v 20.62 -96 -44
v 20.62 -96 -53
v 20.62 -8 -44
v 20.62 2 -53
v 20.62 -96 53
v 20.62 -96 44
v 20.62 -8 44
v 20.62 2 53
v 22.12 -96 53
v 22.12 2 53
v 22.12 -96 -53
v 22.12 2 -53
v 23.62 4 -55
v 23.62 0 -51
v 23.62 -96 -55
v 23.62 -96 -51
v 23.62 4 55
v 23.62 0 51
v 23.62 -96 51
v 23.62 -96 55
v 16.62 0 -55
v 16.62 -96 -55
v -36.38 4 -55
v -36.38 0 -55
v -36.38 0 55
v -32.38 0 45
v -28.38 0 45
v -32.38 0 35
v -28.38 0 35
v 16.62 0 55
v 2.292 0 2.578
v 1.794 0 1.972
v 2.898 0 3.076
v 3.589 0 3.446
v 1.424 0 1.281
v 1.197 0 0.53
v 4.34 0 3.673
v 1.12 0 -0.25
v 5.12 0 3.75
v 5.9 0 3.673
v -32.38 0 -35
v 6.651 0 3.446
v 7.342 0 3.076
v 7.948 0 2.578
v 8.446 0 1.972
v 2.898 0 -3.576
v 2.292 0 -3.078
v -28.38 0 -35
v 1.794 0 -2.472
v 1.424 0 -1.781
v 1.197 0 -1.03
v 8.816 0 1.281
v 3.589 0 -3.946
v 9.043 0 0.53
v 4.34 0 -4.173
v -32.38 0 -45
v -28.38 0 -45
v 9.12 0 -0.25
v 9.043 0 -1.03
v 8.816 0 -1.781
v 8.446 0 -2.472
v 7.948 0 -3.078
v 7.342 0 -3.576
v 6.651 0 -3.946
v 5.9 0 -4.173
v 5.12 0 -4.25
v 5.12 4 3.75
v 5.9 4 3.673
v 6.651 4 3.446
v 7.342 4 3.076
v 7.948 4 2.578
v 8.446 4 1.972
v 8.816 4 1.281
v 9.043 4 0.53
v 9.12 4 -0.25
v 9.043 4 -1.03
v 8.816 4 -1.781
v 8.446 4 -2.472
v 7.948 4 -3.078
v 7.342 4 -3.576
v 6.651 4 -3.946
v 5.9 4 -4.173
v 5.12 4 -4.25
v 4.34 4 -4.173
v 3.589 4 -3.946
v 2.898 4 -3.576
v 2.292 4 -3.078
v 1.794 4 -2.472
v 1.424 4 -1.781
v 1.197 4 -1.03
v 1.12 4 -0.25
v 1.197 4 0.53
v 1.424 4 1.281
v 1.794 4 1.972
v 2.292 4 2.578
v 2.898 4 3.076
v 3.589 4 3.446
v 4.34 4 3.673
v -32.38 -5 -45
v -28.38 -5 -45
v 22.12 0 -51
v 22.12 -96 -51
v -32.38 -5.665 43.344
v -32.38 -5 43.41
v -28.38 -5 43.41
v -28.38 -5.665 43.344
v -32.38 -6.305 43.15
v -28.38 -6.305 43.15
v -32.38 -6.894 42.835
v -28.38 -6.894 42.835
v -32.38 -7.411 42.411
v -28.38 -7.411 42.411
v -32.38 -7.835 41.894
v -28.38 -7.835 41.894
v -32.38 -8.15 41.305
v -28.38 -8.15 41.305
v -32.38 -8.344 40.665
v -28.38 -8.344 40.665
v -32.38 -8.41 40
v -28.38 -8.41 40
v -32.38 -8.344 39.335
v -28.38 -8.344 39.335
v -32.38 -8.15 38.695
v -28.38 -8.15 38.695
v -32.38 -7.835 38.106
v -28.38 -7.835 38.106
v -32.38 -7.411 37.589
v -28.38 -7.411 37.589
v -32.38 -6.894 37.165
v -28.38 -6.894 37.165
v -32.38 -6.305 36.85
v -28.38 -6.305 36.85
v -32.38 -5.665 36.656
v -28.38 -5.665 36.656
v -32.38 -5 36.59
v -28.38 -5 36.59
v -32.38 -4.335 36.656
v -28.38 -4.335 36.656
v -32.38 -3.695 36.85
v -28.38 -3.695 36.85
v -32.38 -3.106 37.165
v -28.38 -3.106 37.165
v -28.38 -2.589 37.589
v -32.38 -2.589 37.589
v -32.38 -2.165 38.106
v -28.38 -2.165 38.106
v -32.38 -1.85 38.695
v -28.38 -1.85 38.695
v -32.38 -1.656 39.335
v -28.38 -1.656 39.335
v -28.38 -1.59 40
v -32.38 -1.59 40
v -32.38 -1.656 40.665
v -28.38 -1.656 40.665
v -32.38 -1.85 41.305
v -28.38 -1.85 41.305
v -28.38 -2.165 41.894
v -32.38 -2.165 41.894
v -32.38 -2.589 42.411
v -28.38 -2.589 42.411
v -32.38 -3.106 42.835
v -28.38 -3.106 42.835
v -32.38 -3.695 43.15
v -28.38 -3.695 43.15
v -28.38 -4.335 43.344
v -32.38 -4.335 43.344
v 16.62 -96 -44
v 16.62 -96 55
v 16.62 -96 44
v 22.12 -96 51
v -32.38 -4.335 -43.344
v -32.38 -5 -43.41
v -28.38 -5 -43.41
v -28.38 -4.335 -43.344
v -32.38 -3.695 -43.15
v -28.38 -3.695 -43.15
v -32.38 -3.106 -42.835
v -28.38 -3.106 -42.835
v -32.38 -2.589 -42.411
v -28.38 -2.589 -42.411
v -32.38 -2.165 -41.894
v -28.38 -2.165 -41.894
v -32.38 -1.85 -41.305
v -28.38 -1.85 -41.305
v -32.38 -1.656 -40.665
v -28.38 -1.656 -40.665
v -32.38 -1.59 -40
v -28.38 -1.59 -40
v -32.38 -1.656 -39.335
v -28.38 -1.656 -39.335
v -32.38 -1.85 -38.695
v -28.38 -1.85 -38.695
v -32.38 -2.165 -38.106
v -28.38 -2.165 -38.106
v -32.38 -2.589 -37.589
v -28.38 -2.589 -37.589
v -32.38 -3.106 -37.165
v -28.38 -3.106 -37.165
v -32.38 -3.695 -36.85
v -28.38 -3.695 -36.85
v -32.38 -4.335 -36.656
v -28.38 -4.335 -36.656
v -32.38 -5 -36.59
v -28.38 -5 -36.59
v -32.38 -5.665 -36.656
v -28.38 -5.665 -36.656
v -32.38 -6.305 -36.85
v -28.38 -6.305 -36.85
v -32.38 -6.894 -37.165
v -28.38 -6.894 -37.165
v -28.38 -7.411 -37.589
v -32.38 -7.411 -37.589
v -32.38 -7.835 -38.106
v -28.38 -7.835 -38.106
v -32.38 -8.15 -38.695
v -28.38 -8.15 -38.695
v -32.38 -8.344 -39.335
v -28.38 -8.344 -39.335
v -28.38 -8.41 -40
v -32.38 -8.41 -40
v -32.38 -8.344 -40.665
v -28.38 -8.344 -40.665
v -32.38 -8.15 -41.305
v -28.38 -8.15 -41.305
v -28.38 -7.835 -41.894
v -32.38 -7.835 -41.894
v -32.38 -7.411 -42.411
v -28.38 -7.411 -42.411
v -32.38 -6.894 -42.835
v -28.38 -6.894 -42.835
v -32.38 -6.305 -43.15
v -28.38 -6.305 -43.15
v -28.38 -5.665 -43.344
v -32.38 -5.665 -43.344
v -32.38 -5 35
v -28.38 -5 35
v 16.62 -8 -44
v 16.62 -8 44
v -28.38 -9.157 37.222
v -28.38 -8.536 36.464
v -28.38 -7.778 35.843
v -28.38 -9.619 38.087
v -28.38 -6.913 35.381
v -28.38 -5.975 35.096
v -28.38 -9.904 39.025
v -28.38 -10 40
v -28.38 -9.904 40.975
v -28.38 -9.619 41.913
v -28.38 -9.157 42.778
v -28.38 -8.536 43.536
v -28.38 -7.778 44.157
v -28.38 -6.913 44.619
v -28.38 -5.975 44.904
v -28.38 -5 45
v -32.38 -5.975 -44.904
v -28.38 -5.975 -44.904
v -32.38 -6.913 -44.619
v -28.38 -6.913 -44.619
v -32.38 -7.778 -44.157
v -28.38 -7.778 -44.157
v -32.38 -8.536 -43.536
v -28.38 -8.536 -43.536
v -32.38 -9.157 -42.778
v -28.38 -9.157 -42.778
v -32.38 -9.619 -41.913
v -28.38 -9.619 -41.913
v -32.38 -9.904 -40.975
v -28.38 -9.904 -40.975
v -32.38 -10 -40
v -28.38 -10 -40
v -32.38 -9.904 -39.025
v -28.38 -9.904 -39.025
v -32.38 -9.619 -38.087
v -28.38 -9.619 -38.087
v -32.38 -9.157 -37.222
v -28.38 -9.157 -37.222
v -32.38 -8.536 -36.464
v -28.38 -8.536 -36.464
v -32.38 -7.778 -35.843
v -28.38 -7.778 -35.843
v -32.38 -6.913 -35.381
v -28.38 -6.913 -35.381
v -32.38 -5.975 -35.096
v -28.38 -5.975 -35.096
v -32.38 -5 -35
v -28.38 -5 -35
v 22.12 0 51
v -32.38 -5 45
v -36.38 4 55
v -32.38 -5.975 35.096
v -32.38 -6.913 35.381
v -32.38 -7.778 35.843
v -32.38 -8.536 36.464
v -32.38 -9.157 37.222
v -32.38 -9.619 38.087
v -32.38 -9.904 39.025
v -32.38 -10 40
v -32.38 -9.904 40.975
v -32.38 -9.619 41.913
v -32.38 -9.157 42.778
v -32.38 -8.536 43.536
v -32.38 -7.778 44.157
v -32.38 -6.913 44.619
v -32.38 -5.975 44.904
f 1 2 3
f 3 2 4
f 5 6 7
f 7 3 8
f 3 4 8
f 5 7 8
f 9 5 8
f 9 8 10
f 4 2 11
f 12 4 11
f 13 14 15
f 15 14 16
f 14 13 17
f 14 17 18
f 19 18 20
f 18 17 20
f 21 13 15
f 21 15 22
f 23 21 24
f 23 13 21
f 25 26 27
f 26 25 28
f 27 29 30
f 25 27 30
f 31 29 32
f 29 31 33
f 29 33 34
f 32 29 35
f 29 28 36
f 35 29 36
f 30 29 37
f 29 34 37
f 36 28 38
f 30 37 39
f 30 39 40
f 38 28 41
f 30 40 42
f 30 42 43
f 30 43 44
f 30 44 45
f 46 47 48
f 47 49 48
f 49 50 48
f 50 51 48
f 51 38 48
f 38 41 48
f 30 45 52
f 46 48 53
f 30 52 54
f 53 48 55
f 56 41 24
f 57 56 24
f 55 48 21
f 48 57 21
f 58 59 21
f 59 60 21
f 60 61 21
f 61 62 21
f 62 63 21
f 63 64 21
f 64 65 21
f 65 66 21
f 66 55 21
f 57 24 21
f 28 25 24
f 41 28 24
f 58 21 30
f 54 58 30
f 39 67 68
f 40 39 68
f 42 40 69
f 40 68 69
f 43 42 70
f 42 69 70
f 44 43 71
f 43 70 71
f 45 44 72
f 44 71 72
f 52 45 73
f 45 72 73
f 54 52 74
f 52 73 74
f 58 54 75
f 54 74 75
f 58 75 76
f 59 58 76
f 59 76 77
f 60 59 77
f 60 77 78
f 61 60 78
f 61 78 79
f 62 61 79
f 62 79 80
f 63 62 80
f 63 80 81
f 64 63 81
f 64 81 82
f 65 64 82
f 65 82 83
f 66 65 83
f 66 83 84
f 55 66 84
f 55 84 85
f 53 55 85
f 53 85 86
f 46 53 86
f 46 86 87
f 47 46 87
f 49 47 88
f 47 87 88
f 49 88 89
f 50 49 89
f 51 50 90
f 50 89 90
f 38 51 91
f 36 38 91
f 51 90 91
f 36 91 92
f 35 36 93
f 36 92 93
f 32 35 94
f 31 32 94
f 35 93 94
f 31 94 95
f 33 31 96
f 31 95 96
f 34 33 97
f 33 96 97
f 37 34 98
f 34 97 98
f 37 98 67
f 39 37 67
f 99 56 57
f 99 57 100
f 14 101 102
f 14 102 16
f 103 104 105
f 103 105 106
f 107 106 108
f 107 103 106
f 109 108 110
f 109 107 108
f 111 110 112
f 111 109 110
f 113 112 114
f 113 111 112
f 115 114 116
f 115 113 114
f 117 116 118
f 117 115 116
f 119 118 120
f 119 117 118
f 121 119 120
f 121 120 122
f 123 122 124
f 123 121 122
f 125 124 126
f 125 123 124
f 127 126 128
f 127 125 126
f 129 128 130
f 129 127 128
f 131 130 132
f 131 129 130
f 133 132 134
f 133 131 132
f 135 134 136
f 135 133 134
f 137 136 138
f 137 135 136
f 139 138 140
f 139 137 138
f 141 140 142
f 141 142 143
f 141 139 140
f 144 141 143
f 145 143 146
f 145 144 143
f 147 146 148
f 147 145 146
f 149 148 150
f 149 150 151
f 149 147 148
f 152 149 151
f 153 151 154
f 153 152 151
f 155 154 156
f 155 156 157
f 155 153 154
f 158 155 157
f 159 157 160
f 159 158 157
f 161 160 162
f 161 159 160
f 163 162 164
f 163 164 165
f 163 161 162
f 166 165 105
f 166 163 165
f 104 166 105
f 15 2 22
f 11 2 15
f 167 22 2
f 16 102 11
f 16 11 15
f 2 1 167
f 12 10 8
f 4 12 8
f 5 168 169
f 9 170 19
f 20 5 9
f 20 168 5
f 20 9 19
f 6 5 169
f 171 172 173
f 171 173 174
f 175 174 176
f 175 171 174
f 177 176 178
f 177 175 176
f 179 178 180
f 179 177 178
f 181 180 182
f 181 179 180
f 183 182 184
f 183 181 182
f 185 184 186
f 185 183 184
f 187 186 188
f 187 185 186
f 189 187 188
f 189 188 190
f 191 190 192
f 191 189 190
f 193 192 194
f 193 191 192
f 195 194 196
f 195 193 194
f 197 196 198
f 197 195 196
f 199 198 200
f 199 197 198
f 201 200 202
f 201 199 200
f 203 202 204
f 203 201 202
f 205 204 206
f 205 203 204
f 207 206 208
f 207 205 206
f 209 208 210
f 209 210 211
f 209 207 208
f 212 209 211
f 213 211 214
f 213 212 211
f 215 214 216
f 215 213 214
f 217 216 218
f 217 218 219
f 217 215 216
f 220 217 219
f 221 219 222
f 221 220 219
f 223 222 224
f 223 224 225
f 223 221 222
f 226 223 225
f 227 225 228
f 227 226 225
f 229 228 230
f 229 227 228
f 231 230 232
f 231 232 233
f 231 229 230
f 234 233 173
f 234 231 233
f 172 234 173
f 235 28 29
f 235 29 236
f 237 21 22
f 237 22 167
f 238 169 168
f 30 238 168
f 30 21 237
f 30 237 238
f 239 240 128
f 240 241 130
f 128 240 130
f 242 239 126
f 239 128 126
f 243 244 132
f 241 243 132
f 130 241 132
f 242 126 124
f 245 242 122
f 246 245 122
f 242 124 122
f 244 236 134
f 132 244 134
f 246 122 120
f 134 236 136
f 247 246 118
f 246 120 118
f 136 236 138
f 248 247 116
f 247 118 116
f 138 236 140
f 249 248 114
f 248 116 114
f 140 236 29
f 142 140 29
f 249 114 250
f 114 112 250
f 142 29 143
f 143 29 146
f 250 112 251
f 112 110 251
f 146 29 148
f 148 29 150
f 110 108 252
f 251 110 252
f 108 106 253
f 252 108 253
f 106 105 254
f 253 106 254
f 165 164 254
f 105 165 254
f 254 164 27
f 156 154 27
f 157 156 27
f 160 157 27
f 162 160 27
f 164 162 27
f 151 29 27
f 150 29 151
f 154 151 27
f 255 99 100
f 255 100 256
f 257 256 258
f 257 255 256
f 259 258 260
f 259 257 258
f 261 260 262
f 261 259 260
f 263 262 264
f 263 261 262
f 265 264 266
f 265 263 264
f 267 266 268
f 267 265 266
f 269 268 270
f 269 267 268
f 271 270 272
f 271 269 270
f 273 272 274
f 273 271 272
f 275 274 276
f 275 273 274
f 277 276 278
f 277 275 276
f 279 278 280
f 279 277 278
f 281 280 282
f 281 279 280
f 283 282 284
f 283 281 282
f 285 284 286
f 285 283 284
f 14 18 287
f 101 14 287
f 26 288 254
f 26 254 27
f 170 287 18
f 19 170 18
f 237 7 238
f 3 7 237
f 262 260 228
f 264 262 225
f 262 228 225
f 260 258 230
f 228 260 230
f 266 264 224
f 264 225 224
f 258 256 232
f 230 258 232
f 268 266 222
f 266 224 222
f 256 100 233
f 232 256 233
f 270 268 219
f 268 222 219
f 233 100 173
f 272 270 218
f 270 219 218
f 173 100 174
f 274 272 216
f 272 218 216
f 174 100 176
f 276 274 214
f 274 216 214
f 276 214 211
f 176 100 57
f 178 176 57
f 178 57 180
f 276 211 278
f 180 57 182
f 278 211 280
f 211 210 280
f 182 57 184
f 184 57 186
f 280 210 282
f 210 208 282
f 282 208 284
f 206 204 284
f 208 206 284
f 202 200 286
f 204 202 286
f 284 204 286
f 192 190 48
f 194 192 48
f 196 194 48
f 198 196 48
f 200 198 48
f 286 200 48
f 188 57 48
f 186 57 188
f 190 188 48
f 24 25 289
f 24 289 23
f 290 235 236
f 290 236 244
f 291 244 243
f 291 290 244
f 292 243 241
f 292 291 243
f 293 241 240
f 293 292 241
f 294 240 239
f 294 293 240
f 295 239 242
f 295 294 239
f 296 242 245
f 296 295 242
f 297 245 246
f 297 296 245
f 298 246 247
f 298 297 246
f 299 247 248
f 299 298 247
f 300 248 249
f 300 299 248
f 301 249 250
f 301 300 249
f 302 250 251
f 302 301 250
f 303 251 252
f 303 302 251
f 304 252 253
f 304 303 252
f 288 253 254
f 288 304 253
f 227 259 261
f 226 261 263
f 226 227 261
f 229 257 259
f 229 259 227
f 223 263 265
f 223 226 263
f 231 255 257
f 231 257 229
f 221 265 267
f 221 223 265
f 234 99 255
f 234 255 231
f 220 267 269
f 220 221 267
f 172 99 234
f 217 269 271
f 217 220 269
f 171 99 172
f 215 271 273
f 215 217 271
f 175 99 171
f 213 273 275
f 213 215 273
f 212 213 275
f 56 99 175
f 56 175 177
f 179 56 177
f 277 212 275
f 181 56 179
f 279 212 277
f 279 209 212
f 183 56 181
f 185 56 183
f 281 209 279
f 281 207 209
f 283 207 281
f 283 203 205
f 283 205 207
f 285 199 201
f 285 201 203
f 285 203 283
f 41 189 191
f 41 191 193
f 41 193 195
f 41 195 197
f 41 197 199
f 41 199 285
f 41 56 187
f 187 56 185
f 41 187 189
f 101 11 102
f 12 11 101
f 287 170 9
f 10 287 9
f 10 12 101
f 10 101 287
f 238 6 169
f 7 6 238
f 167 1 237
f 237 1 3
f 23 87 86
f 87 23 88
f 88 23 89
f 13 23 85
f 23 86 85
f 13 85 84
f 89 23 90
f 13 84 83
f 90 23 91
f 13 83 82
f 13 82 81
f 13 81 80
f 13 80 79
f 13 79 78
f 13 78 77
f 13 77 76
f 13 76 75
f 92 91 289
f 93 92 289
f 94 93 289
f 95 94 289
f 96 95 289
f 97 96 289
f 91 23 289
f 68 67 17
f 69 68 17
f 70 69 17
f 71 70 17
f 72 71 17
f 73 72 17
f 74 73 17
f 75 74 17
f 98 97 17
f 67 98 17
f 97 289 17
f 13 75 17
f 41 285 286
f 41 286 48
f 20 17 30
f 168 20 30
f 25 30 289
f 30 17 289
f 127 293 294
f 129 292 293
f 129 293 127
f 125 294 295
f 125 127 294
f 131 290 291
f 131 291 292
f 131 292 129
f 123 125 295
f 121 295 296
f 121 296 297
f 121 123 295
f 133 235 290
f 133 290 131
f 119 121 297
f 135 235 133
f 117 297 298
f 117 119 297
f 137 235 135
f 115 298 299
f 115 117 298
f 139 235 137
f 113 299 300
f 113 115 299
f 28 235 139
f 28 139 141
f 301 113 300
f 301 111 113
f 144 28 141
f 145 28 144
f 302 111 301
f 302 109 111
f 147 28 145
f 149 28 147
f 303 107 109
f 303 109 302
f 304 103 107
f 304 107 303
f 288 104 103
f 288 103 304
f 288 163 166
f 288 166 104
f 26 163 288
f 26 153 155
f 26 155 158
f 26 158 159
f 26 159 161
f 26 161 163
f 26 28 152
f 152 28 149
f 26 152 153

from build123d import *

# Parameters (mm, degrees)
SKETCH1_W           = 57
SKETCH1_H           = 110
BOSS_EXTRUDE1_DEPTH = 4
SKETCH2_W           = 4
SKETCH2_H           = 110
BOSS_EXTRUDE2_DEPTH = 96
SKETCH3_R           = 3.41
BOSS_EXTRUDE3_DEPTH = 4
CUT_EXTRUDE1_REACH  = 121.785
SKETCH4_R           = 4
CUT_EXTRUDE2_REACH  = 126.459
SKETCH5_W           = 88
SKETCH5_H           = 88
BOSS_EXTRUDE4_DEPTH = 55
BOSS_EXTRUDE5_DEPTH = 100


with BuildPart() as part:
    # Sketch1 → Boss-Extrude1 (new body)
    with BuildSketch(Plane(origin=(0, 0, 0), x_dir=(1, 0, 0), z_dir=(0, 1, 0))):
        with Locations((-7.88, 0)):
            Rectangle(SKETCH1_W, SKETCH1_H)
    extrude(amount=BOSS_EXTRUDE1_DEPTH)

    # Sketch2 → Boss-Extrude2 (add)
    with BuildSketch(Plane.XZ):
        with Locations((18.62, 0)):
            Rectangle(SKETCH2_W, SKETCH2_H)
    extrude(amount=BOSS_EXTRUDE2_DEPTH)

    # Sketch3 → Boss-Extrude3 (add)
    # profile 1 of 2: a face of its own
    with BuildSketch(Plane(origin=(-32.38, 0, 0), x_dir=(0, 0, -1), z_dir=(1, 0, 0))):
        with BuildLine():
            Line((45, 0), (45, -5))
            ThreePointArc((45, -5), (40, -10), (35, -5))
            Line((35, -5), (35, 0))
            Line((35, 0), (45, 0))
        make_face()
        with Locations((40, -5)):
            Circle(SKETCH3_R, mode=Mode.SUBTRACT)
    # profile 2 of 2: a face of its own
    with BuildSketch(Plane(origin=(-32.38, 0, 0), x_dir=(0, 0, -1), z_dir=(1, 0, 0))):
        with BuildLine():
            Line((-35, 0), (-35, -5))
            ThreePointArc((-35, -5), (-40, -10), (-45, -5))
            Line((-45, -5), (-45, 0))
            Line((-45, 0), (-35, 0))
        make_face()
        with Locations(Location((-40, -5, 0), (0, 0, 180))):
            Circle(SKETCH3_R, mode=Mode.SUBTRACT)
    extrude(amount=BOSS_EXTRUDE3_DEPTH)

    # Sketch4 → Cut-Extrude1 (cut, up to next)
    with BuildSketch(Plane(origin=(0, 4, 0), x_dir=(1, 0, 0), z_dir=(0, 1, 0)), mode=Mode.PRIVATE) as cut_extrude1_sk1:
        with Locations(Location((5.12, 0.25, 0), (0, 0, 270))):
            Circle(SKETCH4_R)
    cut_extrude1_tool1 = extrude(cut_extrude1_sk1.sketch, amount=-CUT_EXTRUDE1_REACH, mode=Mode.PRIVATE) & part.part
    add(cut_extrude1_tool1.solids().sort_by_distance((5.12, 4, -0.25))[0], mode=Mode.SUBTRACT)

    # Sketch5 → Cut-Extrude2 (cut, up to next)
    with BuildSketch(Plane(origin=(20.62, 0, 0), x_dir=(0, 0, -1), z_dir=(1, 0, 0)), mode=Mode.PRIVATE) as cut_extrude2_sk1:
        with Locations((0, -52)):
            Rectangle(SKETCH5_W, SKETCH5_H)
    cut_extrude2_tool1 = extrude(cut_extrude2_sk1.sketch, amount=-CUT_EXTRUDE2_REACH, mode=Mode.PRIVATE) & part.part
    add(cut_extrude2_tool1.solids().sort_by_distance((20.62, -52, 0))[0], mode=Mode.SUBTRACT)

    # Sketch6 → Boss-Extrude4 (add, symmetric)
    with BuildSketch(Plane.XY):
        Polygon((20.62, 2), (20.62, 4), (23.62, 4), (23.62, 0), (22.12, 0), (22.12, 2), align=None)
    extrude(amount=BOSS_EXTRUDE4_DEPTH, both=True)

    # Sketch7 → Boss-Extrude5 (add)
    with BuildSketch(Plane(origin=(0, 4, 0), x_dir=(1, 0, 0), z_dir=(0, 1, 0))):
        Polygon((23.62, 55), (20.62, 55), (20.62, 53), (22.12, 53), (22.12, 51), (23.62, 51), align=None)
        Polygon((23.62, -51), (23.62, -55), (20.62, -55), (20.62, -53), (22.12, -53), (22.12, -51), align=None)
    extrude(amount=-BOSS_EXTRUDE5_DEPTH)


solid = part.part
